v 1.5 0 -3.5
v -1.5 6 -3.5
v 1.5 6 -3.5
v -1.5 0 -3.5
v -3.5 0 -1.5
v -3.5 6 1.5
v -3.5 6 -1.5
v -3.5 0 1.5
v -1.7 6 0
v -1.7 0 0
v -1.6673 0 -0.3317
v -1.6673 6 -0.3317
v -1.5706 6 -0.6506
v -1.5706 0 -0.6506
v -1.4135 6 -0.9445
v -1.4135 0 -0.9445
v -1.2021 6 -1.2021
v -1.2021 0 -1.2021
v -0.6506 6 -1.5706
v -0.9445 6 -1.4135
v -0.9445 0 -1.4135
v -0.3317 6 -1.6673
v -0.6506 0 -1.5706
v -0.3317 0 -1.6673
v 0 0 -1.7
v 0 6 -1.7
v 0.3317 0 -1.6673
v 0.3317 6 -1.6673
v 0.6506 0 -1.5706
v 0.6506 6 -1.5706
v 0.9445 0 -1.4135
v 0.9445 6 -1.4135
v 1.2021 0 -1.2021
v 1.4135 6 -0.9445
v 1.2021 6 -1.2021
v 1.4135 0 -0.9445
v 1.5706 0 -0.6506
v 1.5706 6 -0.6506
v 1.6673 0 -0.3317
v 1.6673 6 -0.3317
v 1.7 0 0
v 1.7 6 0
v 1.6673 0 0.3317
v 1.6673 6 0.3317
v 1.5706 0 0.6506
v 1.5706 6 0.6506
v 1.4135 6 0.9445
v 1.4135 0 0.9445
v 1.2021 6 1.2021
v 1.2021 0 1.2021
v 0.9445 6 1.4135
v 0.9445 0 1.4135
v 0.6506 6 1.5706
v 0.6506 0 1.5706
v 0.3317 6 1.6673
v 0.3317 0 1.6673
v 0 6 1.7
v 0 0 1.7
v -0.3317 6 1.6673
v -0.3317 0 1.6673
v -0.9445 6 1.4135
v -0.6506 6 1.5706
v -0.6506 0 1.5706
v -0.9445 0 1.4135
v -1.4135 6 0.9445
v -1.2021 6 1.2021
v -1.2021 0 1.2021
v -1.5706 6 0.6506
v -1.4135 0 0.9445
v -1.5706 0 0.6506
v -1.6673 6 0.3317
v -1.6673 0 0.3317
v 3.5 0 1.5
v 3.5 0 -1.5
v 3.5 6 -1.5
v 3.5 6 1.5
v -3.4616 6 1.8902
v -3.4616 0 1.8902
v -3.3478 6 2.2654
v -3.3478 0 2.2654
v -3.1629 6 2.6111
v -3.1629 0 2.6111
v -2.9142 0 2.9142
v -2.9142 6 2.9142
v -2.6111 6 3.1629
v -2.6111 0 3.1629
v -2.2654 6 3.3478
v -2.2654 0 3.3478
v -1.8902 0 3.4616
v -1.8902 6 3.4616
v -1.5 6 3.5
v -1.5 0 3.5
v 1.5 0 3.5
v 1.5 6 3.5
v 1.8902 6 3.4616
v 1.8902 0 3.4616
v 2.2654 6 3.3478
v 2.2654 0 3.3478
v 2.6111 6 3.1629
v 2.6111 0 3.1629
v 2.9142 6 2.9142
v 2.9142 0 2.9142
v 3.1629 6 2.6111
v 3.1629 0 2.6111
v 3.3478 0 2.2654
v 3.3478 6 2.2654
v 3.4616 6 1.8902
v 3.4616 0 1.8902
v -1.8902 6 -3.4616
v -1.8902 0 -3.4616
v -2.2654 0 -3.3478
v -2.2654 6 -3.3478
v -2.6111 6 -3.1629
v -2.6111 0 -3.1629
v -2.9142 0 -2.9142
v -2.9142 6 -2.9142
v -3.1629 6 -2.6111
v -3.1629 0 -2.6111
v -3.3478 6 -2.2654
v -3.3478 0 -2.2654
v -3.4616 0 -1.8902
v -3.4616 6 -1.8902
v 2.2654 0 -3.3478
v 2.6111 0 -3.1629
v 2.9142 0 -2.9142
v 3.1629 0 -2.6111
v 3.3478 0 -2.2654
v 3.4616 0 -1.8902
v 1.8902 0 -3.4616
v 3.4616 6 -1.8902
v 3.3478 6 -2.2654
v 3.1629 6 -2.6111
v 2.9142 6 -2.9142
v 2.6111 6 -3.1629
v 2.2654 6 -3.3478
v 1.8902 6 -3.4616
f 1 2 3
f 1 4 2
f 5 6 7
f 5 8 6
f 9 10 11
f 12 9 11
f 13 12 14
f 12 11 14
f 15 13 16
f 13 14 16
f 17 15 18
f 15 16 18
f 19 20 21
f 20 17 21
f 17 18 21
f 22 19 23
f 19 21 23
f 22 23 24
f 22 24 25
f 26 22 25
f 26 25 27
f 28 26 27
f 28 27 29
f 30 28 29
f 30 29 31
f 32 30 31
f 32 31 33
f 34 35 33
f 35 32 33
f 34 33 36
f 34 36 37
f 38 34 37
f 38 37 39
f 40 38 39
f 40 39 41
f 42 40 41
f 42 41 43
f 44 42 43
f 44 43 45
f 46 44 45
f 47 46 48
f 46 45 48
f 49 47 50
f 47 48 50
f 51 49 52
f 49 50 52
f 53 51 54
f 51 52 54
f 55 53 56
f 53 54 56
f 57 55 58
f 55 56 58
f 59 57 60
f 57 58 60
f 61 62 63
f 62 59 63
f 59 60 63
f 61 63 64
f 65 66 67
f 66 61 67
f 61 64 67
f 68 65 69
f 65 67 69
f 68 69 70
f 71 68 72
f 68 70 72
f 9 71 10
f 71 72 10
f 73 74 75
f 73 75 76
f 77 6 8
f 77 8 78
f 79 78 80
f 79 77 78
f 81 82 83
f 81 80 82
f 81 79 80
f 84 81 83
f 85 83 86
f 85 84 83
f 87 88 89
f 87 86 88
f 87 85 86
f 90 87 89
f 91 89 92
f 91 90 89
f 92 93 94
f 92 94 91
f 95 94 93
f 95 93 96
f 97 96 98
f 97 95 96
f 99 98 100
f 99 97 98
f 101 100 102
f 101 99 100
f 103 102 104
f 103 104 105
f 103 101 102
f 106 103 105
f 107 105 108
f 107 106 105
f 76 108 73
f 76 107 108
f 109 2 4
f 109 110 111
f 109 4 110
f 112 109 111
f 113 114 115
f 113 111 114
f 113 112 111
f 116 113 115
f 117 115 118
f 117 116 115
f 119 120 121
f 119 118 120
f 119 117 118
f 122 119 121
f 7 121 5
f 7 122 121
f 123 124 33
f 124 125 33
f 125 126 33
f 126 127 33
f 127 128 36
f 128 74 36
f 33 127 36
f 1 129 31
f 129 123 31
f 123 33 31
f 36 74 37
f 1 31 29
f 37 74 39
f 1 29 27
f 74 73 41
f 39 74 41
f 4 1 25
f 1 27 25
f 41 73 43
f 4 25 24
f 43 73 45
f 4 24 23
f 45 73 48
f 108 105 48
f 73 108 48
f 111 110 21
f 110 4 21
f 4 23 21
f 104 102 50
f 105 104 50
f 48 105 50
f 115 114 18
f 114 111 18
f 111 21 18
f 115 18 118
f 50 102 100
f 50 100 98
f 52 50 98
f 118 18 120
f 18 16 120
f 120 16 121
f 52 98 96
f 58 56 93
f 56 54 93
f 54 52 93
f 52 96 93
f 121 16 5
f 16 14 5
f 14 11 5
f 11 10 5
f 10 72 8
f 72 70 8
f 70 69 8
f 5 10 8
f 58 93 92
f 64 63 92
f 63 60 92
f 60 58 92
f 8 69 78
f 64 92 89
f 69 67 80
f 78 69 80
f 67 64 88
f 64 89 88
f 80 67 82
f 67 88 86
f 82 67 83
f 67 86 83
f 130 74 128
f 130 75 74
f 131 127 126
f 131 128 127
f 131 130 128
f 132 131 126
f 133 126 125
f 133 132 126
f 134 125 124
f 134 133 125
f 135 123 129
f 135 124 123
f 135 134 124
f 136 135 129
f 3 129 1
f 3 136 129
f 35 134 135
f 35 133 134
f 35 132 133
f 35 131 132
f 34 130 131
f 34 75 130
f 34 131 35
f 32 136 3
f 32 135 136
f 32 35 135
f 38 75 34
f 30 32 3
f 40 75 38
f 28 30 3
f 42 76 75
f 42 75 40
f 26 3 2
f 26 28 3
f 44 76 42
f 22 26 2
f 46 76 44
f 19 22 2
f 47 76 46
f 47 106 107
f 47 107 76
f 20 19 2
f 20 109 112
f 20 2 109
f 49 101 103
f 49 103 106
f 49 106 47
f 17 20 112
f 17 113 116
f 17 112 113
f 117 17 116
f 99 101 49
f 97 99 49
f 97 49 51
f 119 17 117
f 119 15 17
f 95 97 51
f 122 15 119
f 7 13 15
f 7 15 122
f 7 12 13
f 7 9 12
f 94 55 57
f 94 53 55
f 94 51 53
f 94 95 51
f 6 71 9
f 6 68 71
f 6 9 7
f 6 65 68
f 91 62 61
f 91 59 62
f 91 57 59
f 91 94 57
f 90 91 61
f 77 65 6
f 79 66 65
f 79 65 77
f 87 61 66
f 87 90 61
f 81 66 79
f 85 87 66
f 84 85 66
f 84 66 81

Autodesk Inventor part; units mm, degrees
ref_plane "YZ Plane" through (0, 0, 0) normal (1, 0, 0) x (0, 1, 0)
ref_plane "XZ Plane" through (0, 0, 0) normal (0, 1, 0) x (-1, 0, 0)
ref_plane "XY Plane" through (0, 0, 0) normal (0, 0, 1) x (1, 0, 0)
sketch "Sketch1" plane through (0, 0, 0) normal (0, 1, 0) x (-1, 0, 0)
  circle A0 centre (0, 0) radius 1.7
  line L0 (-3.5, 3.5) -> (3.5, 3.5)
  line L1 (3.5, 3.5) -> (3.5, -3.5)
  line L2 (3.5, -3.5) -> (-3.5, -3.5)
  line L3 (-3.5, -3.5) -> (-3.5, 3.5)
  line L4 (-3.5, 3.5) -> (3.5, -3.5) construction
  line L5 (3.5, 3.5) -> (-3.5, -3.5) construction
  dimension "d0" = 3.4
  dimension "d1" = 7
extrude "Extrusion1" add sketch "Sketch1" along normal blind 6
fillet "Fillet1" radius 2 4 edges at (3.5, 3, 3.5) (3.5, 3, -3.5) (-3.5, 3, -3.5) (-3.5, 3, 3.5)
properties part number "lcd_spacer"
